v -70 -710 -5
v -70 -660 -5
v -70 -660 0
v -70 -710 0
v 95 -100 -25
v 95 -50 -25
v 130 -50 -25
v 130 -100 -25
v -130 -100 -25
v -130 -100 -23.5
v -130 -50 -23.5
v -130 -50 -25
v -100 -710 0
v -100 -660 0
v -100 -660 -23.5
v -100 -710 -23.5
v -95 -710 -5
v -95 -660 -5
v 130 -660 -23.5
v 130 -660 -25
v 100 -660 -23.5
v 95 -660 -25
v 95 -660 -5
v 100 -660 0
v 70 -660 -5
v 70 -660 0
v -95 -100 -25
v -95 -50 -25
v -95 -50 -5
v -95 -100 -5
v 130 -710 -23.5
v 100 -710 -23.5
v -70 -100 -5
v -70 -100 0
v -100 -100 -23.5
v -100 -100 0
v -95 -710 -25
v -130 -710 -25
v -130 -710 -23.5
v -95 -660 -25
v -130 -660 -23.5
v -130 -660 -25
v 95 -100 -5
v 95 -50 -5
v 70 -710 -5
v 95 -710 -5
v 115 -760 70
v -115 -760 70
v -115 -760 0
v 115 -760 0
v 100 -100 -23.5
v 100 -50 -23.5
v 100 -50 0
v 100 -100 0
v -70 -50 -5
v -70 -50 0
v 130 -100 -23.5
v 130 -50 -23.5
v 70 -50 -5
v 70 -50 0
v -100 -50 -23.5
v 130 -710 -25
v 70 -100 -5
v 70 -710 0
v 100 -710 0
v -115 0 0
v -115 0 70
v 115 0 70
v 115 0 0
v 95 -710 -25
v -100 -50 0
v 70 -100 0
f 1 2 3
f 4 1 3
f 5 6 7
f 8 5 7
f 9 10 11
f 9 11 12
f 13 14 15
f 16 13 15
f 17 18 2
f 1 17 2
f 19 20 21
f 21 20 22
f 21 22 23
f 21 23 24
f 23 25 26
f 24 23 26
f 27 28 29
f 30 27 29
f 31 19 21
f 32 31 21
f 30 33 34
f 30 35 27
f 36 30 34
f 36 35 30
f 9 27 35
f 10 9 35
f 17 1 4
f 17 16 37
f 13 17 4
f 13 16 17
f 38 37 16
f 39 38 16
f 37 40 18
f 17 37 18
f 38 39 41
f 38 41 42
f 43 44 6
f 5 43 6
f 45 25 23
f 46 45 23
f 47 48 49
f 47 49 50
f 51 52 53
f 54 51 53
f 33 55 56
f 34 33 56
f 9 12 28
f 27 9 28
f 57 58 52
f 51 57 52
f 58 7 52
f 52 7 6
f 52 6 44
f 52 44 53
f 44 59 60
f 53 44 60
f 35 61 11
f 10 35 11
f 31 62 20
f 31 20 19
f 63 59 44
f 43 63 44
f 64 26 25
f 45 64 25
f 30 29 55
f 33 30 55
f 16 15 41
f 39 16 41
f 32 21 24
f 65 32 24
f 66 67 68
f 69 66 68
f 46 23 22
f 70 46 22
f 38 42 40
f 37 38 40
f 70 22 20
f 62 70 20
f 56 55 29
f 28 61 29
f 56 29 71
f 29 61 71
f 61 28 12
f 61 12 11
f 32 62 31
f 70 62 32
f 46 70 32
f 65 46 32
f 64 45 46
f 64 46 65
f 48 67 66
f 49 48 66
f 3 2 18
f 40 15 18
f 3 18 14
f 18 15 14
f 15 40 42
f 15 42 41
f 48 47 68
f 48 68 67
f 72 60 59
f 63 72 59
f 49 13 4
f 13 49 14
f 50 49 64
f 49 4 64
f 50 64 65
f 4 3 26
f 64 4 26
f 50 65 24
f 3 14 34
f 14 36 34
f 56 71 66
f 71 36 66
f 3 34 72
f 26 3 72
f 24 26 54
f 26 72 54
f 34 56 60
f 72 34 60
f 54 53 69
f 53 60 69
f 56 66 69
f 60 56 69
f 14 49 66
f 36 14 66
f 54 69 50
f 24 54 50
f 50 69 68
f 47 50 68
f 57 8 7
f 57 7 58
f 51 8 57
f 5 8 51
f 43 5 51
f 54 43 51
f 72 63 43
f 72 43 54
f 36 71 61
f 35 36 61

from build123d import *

# Parameters (mm, degrees)
F1_DEPTH = 760
F2_W     = 50
F2_H     = 25
F2_W_2   = 560
F3_DEPTH = 260.001


with BuildPart() as f1:
    # F0 (on Front) → F1 (new body)
    with BuildSketch(Plane.XZ):
        Polygon((115, 70), (-115, 70), (-115, 0), (-100, 0), (-70, 0), (70, 0), (100, 0), (115, 0), align=None)
        Polygon((-70, 0), (-100, 0), (-100, -23.5), (-130, -23.5), (-130, -25), (-95, -25), (-95, -5), (-70, -5), align=None)
        Polygon((100, -23.5), (100, 0), (70, 0), (70, -5), (95, -5), (95, -25), (130, -25), (130, -23.5), align=None)
    extrude(amount=F1_DEPTH)

    # F2 (on face) → F3 (cut, through all)
    with BuildSketch(Plane(origin=(-130, 0, 0), x_dir=(0, -1, 0), z_dir=(-1, 0, 0))):
        with Locations((25, -12.5)):
            Rectangle(F2_W, F2_H)
        with Locations((735, -12.5)):
            Rectangle(F2_W, F2_H)
        with Locations((380, -12.5)):
            Rectangle(F2_W_2, F2_H)
    extrude(amount=-F3_DEPTH, mode=Mode.SUBTRACT)


solid = f1.part
